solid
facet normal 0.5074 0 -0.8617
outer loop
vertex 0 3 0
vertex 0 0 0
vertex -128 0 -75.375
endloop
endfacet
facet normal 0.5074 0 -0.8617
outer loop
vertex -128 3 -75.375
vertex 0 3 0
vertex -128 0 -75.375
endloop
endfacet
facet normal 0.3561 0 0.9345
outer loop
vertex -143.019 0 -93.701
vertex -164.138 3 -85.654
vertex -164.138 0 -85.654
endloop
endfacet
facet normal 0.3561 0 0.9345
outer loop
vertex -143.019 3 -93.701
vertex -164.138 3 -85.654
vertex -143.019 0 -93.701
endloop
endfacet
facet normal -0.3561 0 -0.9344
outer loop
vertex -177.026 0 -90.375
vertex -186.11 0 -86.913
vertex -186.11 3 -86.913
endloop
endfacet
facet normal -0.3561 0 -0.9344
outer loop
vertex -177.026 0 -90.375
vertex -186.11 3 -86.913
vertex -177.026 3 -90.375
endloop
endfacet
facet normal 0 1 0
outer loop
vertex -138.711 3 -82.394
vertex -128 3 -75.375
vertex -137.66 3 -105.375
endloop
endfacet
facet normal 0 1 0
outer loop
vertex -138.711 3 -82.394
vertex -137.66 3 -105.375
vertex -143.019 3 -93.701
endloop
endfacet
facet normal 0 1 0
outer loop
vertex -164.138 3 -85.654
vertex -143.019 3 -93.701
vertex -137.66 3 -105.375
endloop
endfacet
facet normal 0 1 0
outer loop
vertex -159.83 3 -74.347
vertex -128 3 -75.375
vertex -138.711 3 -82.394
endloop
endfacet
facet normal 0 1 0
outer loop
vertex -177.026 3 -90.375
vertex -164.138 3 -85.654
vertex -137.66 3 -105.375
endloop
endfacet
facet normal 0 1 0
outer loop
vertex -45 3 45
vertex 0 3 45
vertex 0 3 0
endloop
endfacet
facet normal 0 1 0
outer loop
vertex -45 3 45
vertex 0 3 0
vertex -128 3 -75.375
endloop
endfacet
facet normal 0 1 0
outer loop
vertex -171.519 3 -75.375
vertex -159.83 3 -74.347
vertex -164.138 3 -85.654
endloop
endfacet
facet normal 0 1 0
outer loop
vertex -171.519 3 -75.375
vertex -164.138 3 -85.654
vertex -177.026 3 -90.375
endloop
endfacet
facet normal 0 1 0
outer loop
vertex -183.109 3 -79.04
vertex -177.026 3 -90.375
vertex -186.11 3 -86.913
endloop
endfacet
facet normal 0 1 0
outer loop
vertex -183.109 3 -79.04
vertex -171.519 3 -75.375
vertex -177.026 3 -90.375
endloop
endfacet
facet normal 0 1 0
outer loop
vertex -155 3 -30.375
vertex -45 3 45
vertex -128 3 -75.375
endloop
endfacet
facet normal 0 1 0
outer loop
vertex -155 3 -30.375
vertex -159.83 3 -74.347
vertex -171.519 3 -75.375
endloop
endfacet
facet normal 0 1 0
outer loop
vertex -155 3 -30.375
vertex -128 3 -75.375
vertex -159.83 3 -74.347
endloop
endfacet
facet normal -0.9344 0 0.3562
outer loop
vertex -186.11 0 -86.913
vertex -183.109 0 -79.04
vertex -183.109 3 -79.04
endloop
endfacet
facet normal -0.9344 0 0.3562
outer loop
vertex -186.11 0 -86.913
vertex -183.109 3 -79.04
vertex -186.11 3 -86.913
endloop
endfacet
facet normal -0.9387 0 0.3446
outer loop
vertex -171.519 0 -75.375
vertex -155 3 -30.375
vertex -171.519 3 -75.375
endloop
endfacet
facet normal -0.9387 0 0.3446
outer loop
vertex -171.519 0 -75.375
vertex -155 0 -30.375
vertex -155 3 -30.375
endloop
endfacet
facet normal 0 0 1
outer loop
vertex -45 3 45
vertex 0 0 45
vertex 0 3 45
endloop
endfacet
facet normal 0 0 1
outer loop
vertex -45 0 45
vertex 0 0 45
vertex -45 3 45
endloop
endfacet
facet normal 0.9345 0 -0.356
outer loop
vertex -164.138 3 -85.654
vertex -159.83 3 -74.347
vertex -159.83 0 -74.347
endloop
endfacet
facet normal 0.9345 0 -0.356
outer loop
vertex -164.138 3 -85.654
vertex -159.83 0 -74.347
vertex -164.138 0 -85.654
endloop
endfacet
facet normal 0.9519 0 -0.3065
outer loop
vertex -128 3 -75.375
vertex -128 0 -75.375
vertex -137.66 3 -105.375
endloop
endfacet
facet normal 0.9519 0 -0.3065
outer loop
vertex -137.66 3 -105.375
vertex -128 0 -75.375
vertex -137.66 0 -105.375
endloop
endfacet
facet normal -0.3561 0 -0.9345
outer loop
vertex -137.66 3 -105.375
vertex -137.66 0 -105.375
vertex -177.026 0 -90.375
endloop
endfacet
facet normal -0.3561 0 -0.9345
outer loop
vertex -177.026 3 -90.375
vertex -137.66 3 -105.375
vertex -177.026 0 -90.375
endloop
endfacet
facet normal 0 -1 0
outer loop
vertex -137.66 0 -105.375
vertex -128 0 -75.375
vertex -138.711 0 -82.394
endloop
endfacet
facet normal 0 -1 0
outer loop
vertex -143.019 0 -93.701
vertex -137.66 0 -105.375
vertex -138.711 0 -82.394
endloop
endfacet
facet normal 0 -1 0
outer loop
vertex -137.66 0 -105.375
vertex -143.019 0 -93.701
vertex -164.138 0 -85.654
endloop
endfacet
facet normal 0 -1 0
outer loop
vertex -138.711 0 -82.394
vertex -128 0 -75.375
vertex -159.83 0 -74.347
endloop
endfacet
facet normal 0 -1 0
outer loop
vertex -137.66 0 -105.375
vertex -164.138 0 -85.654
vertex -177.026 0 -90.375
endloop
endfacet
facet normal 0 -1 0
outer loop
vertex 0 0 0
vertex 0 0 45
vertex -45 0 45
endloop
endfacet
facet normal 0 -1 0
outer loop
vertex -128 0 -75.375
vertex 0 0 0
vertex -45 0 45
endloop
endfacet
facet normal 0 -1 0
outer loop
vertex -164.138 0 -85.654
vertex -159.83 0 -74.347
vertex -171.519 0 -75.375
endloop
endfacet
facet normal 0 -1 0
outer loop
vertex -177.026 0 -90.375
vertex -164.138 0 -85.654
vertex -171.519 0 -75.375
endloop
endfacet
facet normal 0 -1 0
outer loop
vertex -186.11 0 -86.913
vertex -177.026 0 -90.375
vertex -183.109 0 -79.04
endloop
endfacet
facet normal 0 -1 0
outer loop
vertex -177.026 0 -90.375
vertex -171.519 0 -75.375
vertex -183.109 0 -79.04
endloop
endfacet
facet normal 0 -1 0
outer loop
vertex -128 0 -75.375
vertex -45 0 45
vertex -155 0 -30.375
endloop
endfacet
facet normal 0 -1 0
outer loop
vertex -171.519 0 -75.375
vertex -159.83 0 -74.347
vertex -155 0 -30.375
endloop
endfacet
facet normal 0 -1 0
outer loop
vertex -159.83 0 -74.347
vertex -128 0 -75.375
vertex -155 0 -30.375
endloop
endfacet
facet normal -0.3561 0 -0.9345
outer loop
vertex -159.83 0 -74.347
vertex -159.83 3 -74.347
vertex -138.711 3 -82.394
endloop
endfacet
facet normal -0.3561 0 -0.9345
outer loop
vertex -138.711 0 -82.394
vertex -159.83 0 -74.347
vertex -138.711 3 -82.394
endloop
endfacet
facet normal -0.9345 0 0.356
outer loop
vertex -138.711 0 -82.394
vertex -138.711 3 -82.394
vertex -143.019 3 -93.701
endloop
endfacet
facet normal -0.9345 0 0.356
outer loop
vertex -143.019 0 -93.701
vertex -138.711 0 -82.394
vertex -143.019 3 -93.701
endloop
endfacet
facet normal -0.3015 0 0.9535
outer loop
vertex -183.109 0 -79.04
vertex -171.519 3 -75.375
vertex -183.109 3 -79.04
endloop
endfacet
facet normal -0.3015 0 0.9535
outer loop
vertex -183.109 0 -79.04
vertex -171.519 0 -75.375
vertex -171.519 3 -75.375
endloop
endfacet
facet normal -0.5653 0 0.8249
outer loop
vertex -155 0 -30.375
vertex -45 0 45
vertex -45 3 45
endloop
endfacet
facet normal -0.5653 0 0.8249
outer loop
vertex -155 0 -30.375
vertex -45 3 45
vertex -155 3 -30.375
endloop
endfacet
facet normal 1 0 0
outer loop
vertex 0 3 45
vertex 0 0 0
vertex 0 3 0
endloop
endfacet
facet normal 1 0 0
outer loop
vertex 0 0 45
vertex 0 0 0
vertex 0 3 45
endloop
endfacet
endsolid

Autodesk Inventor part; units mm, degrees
ref_plane "YZ Plane" through (0, 0, 0) normal (1, 0, 0) x (0, 1, 0)
ref_plane "XZ Plane" through (0, 0, 0) normal (0, 1, 0) x (-1, 0, 0)
ref_plane "XY Plane" through (0, 0, 0) normal (0, 0, 1) x (1, 0, 0)
sketch "Esquisse1" plane through (0, 0, 0) normal (0, 1, 0) x (-1, 0, 0)
  line L0 (0, 0) -> (0, 45)
  line L1 (0, 45) -> (45, 45)
  line L2 (0, 0) -> (128, -75.3746)
  line L3 (45, 45) -> (155, -30.3746)
  line L4 (155, -30.3746) -> (171.5194, -75.3746)
  line L5 (128, -75.3746) -> (137.66, -105.3746)
  line L6 (137.66, -105.3746) -> (177.0258, -90.3746)
  line L7 (171.5194, -75.3746) -> (183.1092, -79.0397)
  line L8 (183.1092, -79.0397) -> (186.1095, -86.9134)
  line L9 (186.1095, -86.9134) -> (177.0258, -90.3746)
  dimension "d0" = 45
  dimension "d1" = 45
  dimension "d13" = 128
  dimension "d14" = 110
  dimension "d15" = 30
  dimension "d16" = 45
extrude "Extrusion1" add sketch "Esquisse1" along normal blind 3
sketch "Esquisse2" plane through (0, 3, 0) normal (0, 1, 0) x (1, 0, 0)
  line L0 (-164.1382, 85.6541) -> (-143.0194, 93.7013)
  line L1 (-159.8297, 74.3472) -> (-138.7109, 82.3943)
  line L2 (-137.66, 105.3746) -> (-186.1095, 86.9134) projected
  line L3 (-138.7109, 82.3943) -> (-143.0194, 93.7013)
  line L4 (-159.8297, 74.3472) -> (-164.1382, 85.6541)
  point P0 (0, 0)
  dimension "d19" = 9
  dimension "d20" = 9
  dimension "d22" = 12.1
  dimension "d23" = 12.1
  dimension "d24" = 22.6
extrude "Extrusion2" cut sketch "Esquisse2" against normal blind 3
